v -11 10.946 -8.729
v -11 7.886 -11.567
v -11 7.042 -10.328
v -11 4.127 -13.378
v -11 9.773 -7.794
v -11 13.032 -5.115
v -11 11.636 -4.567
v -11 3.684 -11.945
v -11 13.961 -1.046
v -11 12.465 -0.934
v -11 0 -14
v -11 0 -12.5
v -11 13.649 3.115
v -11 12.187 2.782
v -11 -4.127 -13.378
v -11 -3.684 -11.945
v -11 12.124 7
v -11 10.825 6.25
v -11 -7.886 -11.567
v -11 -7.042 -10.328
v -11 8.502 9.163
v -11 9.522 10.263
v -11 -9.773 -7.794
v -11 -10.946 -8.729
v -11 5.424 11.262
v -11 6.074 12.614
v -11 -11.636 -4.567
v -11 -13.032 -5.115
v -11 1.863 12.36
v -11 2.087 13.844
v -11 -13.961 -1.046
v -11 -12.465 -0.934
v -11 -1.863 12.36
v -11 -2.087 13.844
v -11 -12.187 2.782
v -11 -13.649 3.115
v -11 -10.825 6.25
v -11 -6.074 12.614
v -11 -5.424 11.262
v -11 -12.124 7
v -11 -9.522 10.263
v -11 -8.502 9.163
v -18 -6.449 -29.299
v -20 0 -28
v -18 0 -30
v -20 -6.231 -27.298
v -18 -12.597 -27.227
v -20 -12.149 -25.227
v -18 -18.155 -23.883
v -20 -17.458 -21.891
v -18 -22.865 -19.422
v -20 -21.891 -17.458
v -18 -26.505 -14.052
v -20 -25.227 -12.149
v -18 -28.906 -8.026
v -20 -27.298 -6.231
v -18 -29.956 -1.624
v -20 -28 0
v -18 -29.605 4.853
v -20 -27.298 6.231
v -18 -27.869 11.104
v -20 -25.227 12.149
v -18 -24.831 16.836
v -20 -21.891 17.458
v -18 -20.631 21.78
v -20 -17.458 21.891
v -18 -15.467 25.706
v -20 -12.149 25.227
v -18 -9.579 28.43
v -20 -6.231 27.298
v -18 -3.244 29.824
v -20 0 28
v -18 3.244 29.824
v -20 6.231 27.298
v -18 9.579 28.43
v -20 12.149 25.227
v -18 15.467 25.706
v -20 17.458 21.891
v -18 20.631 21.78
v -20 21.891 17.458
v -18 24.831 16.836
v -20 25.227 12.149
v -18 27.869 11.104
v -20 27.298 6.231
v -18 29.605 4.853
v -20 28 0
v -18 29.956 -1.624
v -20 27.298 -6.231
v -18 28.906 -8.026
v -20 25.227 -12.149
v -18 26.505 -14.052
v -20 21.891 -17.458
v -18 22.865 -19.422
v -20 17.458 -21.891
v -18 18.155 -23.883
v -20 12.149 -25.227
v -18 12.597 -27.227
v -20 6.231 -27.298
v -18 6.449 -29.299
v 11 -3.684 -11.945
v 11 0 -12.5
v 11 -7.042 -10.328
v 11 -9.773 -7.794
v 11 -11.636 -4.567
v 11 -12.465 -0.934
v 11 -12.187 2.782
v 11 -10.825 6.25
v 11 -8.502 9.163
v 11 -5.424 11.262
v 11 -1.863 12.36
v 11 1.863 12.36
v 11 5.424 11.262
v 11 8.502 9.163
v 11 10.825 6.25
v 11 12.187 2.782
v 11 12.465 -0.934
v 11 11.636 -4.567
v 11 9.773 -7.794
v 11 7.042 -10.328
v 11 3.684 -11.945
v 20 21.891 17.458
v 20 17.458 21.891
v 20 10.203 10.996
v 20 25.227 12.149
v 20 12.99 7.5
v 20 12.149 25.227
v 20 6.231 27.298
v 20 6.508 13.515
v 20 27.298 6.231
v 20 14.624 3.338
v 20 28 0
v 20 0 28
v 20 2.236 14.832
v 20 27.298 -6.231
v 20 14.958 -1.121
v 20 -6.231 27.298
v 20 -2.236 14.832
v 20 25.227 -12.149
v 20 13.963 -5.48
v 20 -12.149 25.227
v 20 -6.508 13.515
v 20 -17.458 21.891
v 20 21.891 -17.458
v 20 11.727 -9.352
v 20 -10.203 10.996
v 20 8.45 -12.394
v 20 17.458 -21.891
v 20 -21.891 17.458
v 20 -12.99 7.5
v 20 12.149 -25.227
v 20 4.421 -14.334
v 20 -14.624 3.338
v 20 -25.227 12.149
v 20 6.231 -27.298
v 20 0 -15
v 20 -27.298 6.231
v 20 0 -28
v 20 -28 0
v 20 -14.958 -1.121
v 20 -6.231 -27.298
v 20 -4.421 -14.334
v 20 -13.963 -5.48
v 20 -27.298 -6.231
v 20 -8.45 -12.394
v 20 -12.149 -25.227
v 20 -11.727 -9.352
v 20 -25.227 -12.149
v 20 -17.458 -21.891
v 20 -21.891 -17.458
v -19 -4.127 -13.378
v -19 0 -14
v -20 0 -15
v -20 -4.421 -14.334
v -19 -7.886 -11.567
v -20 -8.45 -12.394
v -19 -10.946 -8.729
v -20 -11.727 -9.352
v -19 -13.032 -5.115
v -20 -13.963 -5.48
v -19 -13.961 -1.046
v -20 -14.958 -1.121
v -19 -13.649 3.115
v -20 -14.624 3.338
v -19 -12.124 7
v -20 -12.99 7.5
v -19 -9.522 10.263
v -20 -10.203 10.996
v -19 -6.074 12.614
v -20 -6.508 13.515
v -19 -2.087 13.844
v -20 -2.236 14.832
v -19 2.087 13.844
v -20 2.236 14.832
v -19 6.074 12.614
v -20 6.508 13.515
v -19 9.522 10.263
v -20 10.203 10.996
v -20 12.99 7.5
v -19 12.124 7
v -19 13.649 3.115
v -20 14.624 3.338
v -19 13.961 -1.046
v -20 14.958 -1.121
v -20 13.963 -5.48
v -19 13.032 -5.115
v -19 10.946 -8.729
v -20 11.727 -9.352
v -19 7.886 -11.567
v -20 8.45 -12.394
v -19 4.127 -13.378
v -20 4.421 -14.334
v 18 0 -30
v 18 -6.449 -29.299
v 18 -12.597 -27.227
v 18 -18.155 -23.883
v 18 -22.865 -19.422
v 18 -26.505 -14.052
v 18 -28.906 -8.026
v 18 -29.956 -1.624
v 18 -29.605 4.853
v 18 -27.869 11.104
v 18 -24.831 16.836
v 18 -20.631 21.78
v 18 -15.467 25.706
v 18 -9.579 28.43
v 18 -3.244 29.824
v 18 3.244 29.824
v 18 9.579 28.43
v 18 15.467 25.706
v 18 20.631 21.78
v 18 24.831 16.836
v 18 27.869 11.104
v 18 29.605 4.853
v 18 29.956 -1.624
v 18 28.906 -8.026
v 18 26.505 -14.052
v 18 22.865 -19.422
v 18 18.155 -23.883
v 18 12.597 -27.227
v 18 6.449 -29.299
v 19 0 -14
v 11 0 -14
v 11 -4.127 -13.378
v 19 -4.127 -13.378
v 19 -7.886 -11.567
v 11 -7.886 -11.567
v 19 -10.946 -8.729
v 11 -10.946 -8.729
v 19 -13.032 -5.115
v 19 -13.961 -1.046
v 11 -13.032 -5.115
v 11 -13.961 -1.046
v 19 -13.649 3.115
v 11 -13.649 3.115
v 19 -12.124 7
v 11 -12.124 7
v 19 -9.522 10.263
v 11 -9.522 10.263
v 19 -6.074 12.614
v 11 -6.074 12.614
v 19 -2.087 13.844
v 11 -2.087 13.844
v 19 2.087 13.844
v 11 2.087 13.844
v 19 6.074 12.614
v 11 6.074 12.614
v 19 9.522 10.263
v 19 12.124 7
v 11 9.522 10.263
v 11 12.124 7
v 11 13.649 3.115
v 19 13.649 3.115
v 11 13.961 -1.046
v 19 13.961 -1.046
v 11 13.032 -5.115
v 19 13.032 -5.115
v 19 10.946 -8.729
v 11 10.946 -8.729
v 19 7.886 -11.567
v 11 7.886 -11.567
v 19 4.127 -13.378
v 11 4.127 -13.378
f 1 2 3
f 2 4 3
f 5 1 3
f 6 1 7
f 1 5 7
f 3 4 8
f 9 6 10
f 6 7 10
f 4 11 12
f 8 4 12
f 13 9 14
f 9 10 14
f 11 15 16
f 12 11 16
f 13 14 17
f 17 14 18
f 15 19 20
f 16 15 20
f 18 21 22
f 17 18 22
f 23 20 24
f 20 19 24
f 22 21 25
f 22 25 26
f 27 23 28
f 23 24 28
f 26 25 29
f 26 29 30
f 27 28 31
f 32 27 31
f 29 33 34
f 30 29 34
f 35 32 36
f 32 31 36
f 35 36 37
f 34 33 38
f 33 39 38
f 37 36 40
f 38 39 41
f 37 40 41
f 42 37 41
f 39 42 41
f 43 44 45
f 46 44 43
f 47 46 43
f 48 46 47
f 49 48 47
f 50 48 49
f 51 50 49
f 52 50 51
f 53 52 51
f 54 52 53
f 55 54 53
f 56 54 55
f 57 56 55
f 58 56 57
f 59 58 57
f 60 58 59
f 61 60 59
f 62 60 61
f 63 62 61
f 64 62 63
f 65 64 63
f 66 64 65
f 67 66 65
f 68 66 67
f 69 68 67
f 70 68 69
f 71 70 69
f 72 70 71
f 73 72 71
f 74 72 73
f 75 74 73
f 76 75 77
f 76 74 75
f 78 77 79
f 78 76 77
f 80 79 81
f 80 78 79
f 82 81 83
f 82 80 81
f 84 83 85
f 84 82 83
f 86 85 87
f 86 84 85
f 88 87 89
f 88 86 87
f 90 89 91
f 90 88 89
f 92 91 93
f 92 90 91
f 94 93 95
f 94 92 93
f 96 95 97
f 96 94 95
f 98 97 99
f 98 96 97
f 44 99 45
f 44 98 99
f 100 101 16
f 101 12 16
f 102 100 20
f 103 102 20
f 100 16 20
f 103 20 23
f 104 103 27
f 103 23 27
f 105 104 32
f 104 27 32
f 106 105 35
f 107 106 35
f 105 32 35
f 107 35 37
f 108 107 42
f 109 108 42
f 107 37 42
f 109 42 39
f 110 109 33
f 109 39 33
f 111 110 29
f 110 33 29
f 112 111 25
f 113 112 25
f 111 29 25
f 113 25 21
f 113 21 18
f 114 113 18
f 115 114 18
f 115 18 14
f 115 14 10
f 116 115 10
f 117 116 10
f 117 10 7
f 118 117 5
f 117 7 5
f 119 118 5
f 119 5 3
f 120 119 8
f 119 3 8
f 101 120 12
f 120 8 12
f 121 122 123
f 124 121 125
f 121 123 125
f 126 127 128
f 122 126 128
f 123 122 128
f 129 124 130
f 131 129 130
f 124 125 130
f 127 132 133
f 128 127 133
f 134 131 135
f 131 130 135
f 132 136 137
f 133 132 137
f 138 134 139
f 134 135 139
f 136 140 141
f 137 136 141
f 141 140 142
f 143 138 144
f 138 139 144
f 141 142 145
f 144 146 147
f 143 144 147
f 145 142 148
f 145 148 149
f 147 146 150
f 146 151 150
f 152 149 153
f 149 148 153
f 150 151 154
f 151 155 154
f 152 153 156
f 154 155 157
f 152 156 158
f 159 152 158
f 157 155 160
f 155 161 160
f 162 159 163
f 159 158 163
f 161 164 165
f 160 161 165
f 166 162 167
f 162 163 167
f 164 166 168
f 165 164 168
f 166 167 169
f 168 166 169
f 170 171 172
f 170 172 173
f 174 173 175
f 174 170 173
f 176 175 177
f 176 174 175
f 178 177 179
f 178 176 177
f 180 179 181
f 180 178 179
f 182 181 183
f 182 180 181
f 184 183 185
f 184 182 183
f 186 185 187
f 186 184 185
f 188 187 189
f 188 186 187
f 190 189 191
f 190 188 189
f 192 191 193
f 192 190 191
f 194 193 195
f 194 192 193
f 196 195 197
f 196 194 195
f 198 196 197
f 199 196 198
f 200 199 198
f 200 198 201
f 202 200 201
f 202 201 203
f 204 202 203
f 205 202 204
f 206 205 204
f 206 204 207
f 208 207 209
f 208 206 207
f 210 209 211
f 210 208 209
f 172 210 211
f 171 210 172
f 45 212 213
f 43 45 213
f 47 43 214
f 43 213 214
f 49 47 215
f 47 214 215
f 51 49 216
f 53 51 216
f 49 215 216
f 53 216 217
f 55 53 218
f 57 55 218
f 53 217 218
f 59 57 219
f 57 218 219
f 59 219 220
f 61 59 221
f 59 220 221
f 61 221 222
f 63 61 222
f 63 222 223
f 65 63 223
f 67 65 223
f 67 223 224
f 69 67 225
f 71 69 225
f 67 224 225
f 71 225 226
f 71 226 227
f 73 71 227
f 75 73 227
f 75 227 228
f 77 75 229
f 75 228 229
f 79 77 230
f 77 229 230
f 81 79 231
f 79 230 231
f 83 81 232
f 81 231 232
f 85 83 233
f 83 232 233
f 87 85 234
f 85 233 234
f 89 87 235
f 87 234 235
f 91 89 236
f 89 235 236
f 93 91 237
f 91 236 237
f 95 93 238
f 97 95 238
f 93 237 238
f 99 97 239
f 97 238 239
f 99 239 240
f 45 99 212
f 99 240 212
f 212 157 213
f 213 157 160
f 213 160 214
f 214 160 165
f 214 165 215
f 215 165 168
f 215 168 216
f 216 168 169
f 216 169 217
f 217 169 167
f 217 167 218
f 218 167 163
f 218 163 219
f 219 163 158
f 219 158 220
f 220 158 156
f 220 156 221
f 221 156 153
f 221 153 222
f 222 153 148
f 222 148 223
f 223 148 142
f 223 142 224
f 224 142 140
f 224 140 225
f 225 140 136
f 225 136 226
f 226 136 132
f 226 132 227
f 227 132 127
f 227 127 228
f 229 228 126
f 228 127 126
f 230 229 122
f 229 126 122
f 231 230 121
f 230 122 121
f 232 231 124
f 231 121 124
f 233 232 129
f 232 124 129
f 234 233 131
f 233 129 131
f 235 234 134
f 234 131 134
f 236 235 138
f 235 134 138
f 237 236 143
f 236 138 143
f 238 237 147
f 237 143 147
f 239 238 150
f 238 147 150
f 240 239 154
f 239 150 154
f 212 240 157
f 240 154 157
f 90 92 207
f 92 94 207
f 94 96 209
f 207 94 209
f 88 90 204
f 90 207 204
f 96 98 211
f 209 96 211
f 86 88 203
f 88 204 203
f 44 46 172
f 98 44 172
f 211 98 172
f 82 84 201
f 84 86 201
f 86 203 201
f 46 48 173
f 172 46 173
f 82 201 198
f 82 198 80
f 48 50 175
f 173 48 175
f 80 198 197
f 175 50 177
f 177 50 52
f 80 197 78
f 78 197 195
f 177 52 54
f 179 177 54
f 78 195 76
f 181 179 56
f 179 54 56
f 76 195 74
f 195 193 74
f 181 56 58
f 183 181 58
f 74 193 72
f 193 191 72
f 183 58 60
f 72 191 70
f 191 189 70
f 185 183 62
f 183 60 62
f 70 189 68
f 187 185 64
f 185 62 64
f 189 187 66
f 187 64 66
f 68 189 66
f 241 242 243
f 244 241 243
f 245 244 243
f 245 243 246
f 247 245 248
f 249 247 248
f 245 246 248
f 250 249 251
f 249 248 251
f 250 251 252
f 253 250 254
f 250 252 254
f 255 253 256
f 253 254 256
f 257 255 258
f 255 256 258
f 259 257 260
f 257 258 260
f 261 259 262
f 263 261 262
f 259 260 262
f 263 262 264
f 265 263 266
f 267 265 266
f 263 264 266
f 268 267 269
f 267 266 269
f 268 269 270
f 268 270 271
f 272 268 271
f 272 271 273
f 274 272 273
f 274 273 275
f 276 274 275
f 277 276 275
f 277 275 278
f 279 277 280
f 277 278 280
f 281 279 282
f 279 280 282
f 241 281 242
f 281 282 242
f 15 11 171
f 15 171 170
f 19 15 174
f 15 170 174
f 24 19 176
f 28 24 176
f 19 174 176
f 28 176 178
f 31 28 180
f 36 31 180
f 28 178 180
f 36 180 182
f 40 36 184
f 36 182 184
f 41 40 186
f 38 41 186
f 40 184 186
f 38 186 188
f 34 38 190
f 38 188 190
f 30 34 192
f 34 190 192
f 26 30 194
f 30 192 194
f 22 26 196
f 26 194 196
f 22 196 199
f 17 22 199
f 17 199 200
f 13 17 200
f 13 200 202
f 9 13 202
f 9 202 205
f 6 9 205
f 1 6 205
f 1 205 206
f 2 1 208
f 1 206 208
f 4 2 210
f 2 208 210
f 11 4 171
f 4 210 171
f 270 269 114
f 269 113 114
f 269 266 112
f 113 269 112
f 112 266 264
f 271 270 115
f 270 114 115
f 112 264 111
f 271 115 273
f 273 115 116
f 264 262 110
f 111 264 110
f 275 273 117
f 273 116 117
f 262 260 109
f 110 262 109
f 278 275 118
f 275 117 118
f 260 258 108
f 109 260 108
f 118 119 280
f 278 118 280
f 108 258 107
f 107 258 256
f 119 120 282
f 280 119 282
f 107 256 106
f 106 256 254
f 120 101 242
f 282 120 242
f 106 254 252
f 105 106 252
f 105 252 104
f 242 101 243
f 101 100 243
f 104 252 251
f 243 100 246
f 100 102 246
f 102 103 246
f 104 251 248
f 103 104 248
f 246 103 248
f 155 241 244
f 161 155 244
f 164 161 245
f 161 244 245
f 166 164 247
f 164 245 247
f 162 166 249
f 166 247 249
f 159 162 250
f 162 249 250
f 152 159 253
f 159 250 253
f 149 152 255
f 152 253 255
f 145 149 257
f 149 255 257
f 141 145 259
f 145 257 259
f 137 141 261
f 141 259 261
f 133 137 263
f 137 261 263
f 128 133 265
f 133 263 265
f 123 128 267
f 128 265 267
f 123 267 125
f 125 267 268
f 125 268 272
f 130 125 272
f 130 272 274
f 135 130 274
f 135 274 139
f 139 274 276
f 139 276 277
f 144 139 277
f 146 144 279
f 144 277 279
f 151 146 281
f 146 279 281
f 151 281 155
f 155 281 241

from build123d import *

# Parameters (mm, degrees)
CHAMFER_1_SIZE = 2
CHAMFER_2_SIZE = 1


with BuildPart() as part:
    # Эскиз1 → Повернуть1 (revolve)
    with BuildSketch(Plane.XY, mode=Mode.PRIVATE) as revolve_1_sk:
        Polygon((-20, 30), (20, 30), (20, 14), (11, 14), (11, 12.5), (-11, 12.5), (-11, 14), (-20, 14), align=None)
    revolve(revolve_1_sk.sketch.rotate(Axis((0, 0, 0), (-1, 0, 0)), 90), axis=Axis((0, 0, 0), (-1, 0, 0)))

    # Фаска1
    chamfer_1_edges = [part.edges().sort_by_distance(p)[0] for p in [
        (-20, 0, 30),
        (20, 0, 30),
    ]]
    chamfer(chamfer_1_edges, length=CHAMFER_1_SIZE)

    # Фаска2
    chamfer_2_edges = [part.edges().sort_by_distance(p)[0] for p in [
        (-20, 0, 14),
        (20, 0, 14),
    ]]
    chamfer(chamfer_2_edges, length=CHAMFER_2_SIZE)


solid = part.part
